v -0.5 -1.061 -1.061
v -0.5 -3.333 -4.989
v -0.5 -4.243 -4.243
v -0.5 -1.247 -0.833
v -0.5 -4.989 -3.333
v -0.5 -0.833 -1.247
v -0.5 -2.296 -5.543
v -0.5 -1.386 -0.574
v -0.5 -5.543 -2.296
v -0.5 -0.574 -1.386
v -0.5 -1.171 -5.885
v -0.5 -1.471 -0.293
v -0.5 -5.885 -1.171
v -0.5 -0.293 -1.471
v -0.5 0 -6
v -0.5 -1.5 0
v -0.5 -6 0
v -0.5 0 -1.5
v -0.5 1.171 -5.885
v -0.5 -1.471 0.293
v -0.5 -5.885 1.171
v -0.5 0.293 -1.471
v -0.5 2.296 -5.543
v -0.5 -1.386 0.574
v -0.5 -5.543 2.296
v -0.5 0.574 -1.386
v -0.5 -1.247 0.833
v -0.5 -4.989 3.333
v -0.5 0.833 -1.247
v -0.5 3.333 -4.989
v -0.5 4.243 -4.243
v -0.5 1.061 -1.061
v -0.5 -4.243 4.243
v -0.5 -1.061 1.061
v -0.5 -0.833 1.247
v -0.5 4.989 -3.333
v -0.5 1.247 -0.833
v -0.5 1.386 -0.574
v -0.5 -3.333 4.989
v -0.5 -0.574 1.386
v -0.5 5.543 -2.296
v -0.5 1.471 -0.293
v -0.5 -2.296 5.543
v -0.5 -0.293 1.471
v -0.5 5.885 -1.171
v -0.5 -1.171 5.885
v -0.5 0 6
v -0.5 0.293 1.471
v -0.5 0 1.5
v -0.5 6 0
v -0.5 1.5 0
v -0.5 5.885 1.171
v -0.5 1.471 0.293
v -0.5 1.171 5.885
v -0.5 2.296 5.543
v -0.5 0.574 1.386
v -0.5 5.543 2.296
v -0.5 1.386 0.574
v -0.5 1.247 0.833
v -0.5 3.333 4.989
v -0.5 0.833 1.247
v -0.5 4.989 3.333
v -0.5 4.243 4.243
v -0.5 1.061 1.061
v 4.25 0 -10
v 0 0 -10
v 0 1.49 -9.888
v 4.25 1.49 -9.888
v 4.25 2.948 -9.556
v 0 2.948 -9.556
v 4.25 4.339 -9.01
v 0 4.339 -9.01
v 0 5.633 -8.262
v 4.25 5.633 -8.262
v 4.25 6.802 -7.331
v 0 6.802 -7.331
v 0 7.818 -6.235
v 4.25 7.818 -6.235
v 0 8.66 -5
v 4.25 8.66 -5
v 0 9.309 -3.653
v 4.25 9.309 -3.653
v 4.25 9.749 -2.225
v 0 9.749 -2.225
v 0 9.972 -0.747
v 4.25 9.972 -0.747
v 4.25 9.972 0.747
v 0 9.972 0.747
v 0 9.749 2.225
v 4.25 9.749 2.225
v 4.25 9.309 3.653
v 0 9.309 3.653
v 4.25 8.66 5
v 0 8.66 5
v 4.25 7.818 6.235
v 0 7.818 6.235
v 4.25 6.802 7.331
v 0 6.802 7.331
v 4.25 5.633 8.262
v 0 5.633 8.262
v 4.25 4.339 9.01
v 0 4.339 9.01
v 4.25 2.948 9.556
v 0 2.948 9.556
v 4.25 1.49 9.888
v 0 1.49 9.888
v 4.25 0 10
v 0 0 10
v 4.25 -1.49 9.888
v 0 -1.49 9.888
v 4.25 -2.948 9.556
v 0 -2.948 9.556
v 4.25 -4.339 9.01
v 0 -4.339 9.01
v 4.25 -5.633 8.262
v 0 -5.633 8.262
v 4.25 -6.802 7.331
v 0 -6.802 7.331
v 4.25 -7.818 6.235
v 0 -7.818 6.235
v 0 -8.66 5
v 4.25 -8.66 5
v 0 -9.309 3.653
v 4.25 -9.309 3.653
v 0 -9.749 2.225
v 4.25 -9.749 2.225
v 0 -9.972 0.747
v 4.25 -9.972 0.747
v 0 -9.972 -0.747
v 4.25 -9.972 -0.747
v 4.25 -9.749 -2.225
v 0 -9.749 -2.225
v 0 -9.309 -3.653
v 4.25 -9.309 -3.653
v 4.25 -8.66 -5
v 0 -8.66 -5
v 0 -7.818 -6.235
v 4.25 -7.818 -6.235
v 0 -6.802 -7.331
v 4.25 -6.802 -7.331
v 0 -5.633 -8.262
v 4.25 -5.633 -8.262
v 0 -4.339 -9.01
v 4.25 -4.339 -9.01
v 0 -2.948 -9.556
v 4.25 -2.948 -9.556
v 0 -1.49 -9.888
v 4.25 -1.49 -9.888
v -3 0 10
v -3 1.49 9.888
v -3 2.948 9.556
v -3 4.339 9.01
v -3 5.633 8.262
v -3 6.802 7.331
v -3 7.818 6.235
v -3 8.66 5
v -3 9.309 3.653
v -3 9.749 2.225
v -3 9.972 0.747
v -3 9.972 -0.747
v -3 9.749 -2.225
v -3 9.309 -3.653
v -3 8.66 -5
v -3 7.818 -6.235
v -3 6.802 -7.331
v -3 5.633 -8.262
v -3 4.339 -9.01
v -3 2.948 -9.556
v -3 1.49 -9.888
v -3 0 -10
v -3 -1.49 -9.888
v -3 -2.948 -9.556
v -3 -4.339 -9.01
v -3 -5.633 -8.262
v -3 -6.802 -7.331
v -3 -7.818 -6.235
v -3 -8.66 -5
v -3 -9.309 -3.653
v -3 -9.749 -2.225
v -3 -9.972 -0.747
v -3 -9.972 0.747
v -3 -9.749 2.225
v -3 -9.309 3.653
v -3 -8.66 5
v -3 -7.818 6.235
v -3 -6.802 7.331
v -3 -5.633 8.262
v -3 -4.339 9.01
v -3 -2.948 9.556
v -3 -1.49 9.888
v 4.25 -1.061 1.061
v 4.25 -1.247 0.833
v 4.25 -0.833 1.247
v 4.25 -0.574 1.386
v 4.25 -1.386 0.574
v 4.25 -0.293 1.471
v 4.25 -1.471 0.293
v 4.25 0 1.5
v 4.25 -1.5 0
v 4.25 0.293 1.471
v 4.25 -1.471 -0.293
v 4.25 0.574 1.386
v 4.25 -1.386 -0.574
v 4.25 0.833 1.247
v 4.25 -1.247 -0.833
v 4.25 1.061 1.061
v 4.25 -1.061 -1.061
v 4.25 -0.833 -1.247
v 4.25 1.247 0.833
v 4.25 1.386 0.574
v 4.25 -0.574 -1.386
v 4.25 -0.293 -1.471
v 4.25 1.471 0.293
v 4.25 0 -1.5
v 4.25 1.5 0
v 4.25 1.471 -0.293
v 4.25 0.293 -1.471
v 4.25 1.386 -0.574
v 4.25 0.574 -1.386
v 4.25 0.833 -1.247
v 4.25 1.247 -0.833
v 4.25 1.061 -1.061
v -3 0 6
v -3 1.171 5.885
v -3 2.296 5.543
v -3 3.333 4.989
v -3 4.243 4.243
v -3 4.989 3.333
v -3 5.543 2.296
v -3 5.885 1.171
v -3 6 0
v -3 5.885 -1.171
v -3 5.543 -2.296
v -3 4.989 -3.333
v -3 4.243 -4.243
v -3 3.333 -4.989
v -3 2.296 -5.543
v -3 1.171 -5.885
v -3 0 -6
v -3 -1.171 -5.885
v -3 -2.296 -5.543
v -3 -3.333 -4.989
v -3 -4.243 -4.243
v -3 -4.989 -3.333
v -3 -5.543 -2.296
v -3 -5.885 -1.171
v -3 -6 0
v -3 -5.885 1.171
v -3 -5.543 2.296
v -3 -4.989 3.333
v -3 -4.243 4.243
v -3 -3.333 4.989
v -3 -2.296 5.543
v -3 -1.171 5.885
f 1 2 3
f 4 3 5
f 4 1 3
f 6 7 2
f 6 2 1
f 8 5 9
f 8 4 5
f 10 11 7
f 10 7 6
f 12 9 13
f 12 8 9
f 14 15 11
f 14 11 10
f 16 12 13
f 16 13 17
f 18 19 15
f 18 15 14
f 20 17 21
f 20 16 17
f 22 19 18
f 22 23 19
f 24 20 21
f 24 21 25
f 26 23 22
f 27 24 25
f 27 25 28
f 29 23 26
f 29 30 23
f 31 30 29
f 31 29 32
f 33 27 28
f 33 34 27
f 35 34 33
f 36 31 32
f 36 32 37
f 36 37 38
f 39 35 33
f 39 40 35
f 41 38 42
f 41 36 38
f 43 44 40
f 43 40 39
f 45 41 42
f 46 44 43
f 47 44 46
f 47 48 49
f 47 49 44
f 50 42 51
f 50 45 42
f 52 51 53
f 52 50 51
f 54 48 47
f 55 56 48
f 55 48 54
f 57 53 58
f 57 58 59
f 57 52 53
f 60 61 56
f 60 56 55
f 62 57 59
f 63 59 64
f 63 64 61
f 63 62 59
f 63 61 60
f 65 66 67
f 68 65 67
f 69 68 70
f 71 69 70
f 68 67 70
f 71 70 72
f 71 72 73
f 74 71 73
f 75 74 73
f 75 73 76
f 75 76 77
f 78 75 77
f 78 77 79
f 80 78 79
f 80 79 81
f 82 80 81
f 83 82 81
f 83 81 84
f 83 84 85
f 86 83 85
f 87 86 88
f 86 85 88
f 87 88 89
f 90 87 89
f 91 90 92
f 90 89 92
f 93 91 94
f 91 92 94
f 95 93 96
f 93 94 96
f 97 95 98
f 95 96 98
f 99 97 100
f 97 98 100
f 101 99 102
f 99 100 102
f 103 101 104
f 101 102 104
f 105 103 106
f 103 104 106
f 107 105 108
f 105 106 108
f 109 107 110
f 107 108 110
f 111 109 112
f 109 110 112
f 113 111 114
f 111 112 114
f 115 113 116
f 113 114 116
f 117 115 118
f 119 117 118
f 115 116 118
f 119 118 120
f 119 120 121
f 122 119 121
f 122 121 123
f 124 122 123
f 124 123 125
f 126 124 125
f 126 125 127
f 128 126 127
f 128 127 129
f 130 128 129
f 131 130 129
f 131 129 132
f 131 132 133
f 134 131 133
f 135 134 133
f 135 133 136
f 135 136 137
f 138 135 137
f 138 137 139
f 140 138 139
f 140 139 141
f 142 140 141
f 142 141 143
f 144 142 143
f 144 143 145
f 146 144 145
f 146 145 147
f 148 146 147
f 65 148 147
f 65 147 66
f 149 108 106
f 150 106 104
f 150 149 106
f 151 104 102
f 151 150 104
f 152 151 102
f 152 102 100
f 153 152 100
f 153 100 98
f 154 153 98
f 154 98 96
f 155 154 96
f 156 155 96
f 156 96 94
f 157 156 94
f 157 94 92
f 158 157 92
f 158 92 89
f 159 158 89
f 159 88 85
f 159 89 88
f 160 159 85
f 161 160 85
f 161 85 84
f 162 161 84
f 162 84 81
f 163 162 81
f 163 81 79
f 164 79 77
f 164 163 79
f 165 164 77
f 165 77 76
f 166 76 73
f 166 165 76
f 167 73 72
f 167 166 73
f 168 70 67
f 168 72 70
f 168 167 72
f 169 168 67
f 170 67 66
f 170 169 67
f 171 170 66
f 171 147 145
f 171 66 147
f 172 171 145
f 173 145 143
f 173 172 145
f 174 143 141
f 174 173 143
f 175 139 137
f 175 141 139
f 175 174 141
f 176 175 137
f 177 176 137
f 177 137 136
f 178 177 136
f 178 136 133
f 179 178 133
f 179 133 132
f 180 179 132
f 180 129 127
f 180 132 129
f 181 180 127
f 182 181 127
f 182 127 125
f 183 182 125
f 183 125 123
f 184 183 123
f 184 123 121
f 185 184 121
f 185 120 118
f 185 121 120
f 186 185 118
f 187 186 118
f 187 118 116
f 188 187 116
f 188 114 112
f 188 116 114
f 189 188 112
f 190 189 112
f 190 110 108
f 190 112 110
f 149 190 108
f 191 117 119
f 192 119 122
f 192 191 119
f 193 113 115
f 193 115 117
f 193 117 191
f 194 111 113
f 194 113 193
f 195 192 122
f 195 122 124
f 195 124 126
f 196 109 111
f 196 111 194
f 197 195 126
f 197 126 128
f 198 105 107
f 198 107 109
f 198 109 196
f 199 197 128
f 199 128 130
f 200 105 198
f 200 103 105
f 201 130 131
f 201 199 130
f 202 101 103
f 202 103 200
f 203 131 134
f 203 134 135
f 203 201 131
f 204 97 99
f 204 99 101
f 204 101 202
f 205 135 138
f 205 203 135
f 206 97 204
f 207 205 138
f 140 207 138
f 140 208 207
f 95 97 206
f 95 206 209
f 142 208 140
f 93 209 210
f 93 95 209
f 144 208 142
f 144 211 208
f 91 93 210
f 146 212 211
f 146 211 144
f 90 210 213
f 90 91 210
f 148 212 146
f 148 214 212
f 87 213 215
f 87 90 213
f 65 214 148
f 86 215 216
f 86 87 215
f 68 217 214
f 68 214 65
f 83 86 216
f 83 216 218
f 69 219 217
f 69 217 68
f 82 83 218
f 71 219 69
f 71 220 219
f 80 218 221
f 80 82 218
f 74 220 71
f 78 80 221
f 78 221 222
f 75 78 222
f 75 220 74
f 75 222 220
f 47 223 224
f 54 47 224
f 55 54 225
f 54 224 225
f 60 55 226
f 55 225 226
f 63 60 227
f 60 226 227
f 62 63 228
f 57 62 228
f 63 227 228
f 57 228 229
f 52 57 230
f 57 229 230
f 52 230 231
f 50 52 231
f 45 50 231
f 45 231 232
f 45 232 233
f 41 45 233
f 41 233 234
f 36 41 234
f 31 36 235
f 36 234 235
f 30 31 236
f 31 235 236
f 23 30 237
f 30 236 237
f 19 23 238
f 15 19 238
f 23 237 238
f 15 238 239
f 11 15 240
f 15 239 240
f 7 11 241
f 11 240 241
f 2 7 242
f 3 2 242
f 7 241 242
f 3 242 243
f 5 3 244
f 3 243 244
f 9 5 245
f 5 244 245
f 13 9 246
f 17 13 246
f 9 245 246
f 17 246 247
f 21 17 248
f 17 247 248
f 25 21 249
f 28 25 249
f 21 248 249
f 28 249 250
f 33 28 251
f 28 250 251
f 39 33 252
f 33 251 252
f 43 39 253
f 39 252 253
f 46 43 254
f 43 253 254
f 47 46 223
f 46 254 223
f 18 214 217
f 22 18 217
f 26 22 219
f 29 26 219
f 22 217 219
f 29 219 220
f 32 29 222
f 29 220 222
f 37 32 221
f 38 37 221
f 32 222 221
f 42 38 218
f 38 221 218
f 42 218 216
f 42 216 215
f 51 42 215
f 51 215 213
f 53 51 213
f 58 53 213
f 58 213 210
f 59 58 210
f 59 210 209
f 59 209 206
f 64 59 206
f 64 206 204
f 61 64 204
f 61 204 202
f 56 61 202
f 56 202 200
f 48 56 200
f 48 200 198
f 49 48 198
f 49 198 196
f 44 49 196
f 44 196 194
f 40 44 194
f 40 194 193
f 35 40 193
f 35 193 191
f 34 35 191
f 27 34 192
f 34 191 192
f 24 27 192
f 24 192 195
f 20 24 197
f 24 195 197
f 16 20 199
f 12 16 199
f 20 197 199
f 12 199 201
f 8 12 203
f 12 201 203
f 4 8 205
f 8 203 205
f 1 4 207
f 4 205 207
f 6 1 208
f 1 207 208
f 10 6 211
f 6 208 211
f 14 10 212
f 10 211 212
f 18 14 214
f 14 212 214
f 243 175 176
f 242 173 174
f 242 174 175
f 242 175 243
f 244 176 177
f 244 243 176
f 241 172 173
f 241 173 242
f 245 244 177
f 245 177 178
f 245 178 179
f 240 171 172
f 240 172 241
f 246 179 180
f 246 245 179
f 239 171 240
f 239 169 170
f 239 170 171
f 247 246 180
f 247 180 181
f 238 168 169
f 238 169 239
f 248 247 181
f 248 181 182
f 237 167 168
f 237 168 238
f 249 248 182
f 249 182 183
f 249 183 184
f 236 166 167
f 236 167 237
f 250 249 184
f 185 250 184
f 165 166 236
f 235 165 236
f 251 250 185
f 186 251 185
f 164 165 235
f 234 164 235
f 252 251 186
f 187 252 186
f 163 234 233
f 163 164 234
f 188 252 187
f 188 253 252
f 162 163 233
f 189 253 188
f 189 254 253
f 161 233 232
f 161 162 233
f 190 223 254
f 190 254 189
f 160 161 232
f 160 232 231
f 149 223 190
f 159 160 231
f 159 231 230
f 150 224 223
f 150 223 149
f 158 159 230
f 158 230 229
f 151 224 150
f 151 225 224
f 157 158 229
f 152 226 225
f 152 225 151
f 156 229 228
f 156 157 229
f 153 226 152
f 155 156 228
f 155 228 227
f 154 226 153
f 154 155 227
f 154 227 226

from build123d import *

# Parameters (mm, degrees)
ESBO_O1_R                = 10
RESSALTO_EXTRUS_O1_DEPTH = 4.25
RESSALTO_EXTRUS_O2_START = 3
ESBO_O2_R                = 10
RESSALTO_EXTRUS_O2_DEPTH = 3
CORTE_EXTRUS_O1_REACH    = 17.892
ESBO_O3_R                = 1.5
ESBO_O5_R                = 6
CORTE_EXTRUS_O3_DEPTH    = 2.5


with BuildPart() as part:
    # Esboço1 → Ressalto-extrusão1 (new body)
    with BuildSketch(Plane(origin=(0, 0, 0), x_dir=(0, 0, -1), z_dir=(1, 0, 0))):
        Circle(ESBO_O1_R)
    extrude(amount=RESSALTO_EXTRUS_O1_DEPTH)

    # Esboço2 → Ressalto-extrusão2 (add)
    with BuildSketch(Plane.ZY.offset(RESSALTO_EXTRUS_O2_START)):
        Circle(ESBO_O2_R)
    extrude(amount=-RESSALTO_EXTRUS_O2_DEPTH)

    # Esboço3 → Corte-extrusão1 (cut, up to next)
    with BuildSketch(Plane(origin=(4.25, 0, 0), x_dir=(0, 0, -1), z_dir=(1, 0, 0)), mode=Mode.PRIVATE) as corte_extrus_o1_sk1:
        Circle(ESBO_O3_R)
    corte_extrus_o1_tool1 = extrude(corte_extrus_o1_sk1.sketch, amount=-CORTE_EXTRUS_O1_REACH, mode=Mode.PRIVATE) & part.part
    add(corte_extrus_o1_tool1.solids().sort_by_distance((4.25, 0, 0))[0], mode=Mode.SUBTRACT)

    # Esboço5 → Corte-extrusão3 (cut)
    with BuildSketch(Plane.ZY.offset(3)):
        Circle(ESBO_O5_R)
    extrude(amount=-CORTE_EXTRUS_O3_DEPTH, mode=Mode.SUBTRACT)


solid = part.part
